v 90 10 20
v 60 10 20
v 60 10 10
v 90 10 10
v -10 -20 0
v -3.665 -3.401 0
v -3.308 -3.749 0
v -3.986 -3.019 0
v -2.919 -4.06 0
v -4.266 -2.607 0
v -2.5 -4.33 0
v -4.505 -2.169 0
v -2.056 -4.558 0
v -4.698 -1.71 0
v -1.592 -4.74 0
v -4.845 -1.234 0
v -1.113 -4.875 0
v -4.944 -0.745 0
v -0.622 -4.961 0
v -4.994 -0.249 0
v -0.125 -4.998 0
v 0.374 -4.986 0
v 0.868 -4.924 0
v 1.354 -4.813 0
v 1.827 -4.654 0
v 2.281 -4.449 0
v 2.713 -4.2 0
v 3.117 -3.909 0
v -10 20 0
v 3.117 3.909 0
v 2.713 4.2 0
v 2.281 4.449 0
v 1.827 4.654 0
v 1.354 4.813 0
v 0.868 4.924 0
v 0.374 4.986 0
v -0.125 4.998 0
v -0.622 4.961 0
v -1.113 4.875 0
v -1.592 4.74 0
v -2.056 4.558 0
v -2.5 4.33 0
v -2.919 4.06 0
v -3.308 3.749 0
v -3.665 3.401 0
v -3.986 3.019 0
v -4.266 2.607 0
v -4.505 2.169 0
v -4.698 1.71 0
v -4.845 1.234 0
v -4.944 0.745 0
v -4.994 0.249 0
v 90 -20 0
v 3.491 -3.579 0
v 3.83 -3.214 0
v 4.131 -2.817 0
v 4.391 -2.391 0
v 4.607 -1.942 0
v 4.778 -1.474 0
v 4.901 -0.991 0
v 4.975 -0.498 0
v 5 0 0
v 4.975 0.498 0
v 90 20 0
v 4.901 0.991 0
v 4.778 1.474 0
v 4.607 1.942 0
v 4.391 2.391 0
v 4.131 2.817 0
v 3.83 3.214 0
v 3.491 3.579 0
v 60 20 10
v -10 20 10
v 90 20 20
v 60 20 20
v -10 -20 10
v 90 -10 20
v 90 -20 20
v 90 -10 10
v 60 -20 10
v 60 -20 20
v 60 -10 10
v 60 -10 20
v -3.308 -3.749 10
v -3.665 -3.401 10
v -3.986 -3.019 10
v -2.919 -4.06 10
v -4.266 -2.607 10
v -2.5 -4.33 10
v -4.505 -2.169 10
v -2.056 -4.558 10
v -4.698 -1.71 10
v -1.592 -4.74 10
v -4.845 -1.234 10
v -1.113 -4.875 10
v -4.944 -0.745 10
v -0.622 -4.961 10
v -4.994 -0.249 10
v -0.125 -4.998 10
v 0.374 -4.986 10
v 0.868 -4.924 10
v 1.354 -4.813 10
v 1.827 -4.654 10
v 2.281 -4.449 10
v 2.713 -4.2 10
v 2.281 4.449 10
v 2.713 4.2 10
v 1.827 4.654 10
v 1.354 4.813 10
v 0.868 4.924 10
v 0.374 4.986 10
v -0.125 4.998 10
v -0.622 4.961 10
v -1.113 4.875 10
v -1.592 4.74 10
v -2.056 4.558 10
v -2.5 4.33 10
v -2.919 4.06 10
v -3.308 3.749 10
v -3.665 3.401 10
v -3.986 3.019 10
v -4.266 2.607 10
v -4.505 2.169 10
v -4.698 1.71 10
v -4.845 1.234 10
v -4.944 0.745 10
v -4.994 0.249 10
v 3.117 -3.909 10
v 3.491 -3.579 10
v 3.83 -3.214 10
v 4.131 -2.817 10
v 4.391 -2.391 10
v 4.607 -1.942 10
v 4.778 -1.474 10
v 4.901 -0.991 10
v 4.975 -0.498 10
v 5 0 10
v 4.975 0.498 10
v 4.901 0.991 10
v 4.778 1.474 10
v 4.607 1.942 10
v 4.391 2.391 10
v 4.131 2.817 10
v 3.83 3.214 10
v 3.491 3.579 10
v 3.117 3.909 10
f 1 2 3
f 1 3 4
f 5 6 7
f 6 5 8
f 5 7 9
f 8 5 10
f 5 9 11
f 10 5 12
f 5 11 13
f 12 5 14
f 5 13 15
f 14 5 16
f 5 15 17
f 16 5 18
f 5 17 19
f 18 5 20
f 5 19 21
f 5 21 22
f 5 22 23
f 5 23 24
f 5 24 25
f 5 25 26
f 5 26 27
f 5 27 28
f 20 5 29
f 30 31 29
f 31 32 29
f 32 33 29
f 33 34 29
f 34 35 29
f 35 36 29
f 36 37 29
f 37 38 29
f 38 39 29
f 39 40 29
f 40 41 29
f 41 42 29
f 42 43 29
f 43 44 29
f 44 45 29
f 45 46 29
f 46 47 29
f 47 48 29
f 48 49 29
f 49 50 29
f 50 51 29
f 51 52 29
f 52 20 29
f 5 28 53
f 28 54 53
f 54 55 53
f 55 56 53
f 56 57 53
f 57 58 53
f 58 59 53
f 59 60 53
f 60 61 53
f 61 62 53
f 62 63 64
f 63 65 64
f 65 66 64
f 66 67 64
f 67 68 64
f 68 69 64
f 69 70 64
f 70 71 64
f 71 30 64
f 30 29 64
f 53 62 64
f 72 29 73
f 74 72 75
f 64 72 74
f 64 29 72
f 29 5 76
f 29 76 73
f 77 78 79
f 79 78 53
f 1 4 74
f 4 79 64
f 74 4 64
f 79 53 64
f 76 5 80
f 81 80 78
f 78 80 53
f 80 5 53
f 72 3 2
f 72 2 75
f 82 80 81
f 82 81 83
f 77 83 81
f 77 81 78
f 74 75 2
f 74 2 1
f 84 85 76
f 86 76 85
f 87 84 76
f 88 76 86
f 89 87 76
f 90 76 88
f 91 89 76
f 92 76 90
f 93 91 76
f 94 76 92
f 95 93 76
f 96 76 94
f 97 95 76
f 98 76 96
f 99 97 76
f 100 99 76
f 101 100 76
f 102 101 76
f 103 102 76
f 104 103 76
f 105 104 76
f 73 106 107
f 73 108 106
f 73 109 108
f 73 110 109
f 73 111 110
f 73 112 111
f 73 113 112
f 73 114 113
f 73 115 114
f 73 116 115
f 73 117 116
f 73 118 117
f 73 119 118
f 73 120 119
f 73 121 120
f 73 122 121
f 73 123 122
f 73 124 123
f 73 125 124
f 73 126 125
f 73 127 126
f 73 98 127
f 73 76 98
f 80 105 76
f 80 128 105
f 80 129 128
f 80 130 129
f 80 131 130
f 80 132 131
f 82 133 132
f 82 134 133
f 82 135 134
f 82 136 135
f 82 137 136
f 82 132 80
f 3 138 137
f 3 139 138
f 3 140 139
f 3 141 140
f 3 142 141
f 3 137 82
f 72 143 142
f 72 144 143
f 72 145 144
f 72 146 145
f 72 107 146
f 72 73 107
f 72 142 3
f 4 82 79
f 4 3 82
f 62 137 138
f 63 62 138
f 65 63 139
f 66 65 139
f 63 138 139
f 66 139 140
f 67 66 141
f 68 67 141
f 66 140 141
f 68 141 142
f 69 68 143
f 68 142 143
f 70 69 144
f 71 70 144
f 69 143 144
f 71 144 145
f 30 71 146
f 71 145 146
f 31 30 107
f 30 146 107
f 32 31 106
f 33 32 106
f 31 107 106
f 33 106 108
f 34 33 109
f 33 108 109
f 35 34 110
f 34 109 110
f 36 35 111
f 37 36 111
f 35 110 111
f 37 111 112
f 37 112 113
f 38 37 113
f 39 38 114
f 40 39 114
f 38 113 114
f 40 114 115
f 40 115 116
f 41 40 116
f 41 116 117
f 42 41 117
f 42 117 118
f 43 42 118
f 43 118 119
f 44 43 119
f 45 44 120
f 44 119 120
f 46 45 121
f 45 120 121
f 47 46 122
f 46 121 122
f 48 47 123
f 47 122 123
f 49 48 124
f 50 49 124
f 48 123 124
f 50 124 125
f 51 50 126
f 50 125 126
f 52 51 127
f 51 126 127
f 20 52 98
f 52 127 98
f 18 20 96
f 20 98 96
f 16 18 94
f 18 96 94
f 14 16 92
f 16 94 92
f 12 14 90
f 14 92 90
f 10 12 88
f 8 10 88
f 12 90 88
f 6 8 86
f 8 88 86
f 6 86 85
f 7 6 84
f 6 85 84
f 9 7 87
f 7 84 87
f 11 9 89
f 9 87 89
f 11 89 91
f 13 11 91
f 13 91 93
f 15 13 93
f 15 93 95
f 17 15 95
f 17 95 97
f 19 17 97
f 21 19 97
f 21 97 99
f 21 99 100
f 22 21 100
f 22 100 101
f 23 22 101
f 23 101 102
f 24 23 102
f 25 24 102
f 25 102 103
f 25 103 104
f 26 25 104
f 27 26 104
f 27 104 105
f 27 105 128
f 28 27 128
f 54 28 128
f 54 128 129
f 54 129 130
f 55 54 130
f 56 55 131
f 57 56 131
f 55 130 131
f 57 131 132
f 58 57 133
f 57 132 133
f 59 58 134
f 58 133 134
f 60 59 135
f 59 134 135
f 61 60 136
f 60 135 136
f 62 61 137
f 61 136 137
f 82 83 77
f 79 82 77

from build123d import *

# Parameters (mm, degrees)
F0_W     = 100
F0_H     = 40
F1_DEPTH = 10
F2_R     = 5
F3_DEPTH = 10
F4_W     = 30
F4_H     = 40
F5_DEPTH = 10
F6_W     = 30
F6_H     = 20
F7_DEPTH = 10


with BuildPart() as f1:
    # F0 (on Top) → F1 (new body)
    with BuildSketch(Plane.XY):
        with Locations((40, 0)):
            Rectangle(F0_W, F0_H)
    extrude(amount=F1_DEPTH)

    # F2 (on face) → F3 (cut, through all)
    with BuildSketch(Plane.XY.offset(10)):
        Circle(F2_R)
    extrude(amount=-F3_DEPTH, mode=Mode.SUBTRACT)

    # F4 (on face) → F5 (join)
    with BuildSketch(Plane.XY.offset(10)):
        with Locations((75, 0)):
            Rectangle(F4_W, F4_H)
    extrude(amount=F5_DEPTH)

    # F6 (on face) → F7 (cut)
    with BuildSketch(Plane.XY.offset(20)):
        with Locations((75, 0)):
            Rectangle(F6_W, F6_H)
    extrude(amount=-F7_DEPTH, mode=Mode.SUBTRACT)


solid = f1.part
